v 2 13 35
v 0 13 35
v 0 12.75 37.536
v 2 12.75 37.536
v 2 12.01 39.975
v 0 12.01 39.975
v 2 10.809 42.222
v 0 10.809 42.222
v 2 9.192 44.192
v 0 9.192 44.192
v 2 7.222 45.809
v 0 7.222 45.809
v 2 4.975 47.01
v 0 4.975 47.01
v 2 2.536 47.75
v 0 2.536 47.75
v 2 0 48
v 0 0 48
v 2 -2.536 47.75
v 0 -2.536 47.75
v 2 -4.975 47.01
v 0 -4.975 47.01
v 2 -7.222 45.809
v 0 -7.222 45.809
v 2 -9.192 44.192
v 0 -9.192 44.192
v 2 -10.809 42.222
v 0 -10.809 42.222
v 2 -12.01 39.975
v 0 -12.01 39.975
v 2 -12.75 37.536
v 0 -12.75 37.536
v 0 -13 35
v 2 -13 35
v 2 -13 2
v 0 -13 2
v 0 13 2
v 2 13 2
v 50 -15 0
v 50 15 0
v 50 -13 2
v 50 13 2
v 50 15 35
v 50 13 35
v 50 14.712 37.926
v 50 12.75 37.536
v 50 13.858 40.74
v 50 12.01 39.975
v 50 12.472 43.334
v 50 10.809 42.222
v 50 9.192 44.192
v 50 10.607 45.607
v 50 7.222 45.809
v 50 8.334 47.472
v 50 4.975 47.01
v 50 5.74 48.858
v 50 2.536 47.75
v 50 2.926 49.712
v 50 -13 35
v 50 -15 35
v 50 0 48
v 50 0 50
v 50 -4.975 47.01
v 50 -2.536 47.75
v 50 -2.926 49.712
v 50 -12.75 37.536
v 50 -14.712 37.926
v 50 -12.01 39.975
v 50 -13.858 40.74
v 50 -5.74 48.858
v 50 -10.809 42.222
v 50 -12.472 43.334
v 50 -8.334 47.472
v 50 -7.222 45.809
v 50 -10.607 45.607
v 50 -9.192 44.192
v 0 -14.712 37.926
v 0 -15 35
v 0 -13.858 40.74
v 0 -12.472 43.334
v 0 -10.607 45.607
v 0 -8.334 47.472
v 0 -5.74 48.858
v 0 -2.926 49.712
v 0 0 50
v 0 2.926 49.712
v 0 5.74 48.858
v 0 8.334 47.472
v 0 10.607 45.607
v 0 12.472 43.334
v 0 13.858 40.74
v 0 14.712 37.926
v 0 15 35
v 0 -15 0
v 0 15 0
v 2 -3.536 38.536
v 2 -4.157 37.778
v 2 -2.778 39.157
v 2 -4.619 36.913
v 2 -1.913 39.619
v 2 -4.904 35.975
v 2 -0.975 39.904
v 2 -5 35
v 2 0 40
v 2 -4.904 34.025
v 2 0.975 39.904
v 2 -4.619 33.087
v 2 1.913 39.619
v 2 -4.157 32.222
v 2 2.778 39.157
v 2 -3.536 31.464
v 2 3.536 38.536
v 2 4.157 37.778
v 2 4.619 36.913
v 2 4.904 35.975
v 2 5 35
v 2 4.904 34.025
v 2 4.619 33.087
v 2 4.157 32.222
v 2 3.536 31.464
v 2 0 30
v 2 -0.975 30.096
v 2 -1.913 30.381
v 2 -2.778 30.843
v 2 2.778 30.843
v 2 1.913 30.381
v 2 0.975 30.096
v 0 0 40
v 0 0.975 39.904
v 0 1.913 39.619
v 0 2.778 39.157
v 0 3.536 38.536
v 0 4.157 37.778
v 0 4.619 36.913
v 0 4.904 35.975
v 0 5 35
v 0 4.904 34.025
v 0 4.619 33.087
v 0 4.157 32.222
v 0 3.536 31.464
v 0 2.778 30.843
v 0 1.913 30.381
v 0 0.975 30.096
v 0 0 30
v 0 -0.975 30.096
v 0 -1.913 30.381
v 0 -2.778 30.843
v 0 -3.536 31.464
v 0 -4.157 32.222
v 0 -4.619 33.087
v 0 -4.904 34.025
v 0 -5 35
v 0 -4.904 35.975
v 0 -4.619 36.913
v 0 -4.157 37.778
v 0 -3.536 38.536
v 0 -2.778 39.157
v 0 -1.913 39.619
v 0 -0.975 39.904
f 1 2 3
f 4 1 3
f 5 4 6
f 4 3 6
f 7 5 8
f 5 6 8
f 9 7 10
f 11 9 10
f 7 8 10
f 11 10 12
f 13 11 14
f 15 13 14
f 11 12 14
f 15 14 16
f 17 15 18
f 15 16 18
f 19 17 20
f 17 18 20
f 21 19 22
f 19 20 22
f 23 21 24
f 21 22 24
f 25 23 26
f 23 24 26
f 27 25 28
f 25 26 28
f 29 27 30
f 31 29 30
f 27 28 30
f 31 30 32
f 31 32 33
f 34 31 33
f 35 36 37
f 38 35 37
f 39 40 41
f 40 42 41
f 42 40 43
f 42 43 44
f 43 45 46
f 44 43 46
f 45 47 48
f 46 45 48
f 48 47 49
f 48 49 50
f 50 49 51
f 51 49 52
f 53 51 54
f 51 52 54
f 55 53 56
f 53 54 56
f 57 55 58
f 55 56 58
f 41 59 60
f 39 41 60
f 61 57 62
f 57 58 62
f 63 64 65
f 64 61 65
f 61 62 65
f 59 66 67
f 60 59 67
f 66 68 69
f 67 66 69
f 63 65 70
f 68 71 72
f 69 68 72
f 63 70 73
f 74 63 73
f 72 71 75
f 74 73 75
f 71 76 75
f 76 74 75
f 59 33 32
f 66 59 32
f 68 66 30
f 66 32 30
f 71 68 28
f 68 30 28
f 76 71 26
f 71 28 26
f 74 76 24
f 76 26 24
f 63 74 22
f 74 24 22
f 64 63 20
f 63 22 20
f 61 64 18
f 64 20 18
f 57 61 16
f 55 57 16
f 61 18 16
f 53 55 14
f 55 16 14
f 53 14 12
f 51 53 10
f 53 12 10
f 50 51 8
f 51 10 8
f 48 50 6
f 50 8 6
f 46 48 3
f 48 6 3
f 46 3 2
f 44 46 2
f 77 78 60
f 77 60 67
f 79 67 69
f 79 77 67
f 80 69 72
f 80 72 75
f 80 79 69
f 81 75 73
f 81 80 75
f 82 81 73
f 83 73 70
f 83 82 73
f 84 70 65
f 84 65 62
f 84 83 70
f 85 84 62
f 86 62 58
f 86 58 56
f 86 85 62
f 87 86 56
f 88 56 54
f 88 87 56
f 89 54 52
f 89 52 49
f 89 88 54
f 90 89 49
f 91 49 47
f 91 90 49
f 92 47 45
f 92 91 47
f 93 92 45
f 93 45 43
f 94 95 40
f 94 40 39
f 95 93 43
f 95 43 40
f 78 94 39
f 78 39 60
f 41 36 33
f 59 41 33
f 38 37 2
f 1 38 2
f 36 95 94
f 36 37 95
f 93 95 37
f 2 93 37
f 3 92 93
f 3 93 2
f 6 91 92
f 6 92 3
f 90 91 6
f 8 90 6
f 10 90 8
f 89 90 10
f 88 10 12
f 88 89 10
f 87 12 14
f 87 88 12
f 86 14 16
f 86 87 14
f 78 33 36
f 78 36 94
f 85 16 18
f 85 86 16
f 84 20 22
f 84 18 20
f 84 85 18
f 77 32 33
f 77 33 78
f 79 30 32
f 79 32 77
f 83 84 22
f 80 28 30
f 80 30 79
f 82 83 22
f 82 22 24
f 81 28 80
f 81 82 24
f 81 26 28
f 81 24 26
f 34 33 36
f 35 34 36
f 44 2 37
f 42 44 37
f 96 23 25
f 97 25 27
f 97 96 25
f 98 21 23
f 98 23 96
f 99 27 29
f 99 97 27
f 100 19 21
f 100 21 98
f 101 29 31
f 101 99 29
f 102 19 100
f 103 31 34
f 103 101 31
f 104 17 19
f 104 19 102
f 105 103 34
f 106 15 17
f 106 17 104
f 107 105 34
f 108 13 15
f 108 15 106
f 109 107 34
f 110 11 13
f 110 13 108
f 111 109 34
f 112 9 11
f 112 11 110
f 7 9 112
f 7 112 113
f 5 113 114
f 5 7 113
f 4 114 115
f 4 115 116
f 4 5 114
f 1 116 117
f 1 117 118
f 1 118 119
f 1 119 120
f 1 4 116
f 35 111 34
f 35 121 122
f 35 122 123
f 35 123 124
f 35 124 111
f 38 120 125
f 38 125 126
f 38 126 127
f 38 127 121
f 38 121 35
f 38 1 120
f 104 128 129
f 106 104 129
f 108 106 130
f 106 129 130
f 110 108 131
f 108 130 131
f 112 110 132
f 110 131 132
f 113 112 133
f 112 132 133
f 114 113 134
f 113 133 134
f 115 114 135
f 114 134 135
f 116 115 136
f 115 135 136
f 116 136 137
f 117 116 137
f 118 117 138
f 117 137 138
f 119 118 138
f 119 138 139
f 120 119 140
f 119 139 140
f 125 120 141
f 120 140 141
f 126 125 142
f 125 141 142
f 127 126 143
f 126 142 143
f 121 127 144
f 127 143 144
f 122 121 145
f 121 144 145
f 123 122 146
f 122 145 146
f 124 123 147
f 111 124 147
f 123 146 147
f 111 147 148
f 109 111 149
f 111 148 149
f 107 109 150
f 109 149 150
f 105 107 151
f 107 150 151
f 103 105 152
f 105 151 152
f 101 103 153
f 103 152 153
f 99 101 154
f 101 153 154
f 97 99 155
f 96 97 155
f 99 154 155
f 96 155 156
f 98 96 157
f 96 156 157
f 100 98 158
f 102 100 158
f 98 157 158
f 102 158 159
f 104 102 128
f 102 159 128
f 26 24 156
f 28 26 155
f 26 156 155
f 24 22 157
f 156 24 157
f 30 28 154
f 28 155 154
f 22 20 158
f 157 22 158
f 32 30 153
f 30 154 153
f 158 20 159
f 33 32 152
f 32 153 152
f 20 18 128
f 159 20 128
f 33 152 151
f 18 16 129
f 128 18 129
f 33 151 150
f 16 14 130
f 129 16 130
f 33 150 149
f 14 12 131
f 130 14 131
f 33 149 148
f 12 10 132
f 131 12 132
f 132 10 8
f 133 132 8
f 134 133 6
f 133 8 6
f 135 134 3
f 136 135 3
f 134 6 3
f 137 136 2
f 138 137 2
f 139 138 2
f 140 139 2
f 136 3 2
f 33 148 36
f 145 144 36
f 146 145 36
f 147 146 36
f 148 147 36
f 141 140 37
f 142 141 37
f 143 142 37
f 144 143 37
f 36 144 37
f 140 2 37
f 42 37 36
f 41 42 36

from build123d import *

# Parameters (mm, degrees)
TUBE_BISEAUT_TUBE_BISEAUT_1_1_DEPTH = 50
ESQUISSE12_R                        = 5
BOSS_EXTRU_1_DEPTH                  = 2


with BuildPart() as part:
    # Esquisse11 → Tube biseauté TUBE BISEAUTÉ 1(1) (new body)
    with BuildSketch(Plane.YZ):
        with BuildLine():
            Line((-15, 0), (-15, 35))
            ThreePointArc((-15, 35), (0, 50), (15, 35))
            Line((15, 35), (15, 0))
            Line((15, 0), (-15, 0))
        make_face()
        with BuildLine():
            Line((-13, 2), (-13, 35))
            ThreePointArc((-13, 35), (0, 48), (13, 35))
            Line((13, 35), (13, 2))
            Line((13, 2), (-13, 2))
        make_face(mode=Mode.SUBTRACT)
    extrude(amount=TUBE_BISEAUT_TUBE_BISEAUT_1_1_DEPTH)


with BuildPart() as body_2:
    # Esquisse12 → Boss.-Extru.1 (new body)
    with BuildSketch(Plane.ZY):
        with BuildLine():
            Line((35, -13), (2, -13))
            Line((2, -13), (2, 13))
            Line((2, 13), (35, 13))
            ThreePointArc((35, 13), (48, 0), (35, -13))
        make_face()
        with Locations((35, 0)):
            Circle(ESQUISSE12_R, mode=Mode.SUBTRACT)
    extrude(amount=-BOSS_EXTRU_1_DEPTH)


solid = Compound([part.part, body_2.part])
